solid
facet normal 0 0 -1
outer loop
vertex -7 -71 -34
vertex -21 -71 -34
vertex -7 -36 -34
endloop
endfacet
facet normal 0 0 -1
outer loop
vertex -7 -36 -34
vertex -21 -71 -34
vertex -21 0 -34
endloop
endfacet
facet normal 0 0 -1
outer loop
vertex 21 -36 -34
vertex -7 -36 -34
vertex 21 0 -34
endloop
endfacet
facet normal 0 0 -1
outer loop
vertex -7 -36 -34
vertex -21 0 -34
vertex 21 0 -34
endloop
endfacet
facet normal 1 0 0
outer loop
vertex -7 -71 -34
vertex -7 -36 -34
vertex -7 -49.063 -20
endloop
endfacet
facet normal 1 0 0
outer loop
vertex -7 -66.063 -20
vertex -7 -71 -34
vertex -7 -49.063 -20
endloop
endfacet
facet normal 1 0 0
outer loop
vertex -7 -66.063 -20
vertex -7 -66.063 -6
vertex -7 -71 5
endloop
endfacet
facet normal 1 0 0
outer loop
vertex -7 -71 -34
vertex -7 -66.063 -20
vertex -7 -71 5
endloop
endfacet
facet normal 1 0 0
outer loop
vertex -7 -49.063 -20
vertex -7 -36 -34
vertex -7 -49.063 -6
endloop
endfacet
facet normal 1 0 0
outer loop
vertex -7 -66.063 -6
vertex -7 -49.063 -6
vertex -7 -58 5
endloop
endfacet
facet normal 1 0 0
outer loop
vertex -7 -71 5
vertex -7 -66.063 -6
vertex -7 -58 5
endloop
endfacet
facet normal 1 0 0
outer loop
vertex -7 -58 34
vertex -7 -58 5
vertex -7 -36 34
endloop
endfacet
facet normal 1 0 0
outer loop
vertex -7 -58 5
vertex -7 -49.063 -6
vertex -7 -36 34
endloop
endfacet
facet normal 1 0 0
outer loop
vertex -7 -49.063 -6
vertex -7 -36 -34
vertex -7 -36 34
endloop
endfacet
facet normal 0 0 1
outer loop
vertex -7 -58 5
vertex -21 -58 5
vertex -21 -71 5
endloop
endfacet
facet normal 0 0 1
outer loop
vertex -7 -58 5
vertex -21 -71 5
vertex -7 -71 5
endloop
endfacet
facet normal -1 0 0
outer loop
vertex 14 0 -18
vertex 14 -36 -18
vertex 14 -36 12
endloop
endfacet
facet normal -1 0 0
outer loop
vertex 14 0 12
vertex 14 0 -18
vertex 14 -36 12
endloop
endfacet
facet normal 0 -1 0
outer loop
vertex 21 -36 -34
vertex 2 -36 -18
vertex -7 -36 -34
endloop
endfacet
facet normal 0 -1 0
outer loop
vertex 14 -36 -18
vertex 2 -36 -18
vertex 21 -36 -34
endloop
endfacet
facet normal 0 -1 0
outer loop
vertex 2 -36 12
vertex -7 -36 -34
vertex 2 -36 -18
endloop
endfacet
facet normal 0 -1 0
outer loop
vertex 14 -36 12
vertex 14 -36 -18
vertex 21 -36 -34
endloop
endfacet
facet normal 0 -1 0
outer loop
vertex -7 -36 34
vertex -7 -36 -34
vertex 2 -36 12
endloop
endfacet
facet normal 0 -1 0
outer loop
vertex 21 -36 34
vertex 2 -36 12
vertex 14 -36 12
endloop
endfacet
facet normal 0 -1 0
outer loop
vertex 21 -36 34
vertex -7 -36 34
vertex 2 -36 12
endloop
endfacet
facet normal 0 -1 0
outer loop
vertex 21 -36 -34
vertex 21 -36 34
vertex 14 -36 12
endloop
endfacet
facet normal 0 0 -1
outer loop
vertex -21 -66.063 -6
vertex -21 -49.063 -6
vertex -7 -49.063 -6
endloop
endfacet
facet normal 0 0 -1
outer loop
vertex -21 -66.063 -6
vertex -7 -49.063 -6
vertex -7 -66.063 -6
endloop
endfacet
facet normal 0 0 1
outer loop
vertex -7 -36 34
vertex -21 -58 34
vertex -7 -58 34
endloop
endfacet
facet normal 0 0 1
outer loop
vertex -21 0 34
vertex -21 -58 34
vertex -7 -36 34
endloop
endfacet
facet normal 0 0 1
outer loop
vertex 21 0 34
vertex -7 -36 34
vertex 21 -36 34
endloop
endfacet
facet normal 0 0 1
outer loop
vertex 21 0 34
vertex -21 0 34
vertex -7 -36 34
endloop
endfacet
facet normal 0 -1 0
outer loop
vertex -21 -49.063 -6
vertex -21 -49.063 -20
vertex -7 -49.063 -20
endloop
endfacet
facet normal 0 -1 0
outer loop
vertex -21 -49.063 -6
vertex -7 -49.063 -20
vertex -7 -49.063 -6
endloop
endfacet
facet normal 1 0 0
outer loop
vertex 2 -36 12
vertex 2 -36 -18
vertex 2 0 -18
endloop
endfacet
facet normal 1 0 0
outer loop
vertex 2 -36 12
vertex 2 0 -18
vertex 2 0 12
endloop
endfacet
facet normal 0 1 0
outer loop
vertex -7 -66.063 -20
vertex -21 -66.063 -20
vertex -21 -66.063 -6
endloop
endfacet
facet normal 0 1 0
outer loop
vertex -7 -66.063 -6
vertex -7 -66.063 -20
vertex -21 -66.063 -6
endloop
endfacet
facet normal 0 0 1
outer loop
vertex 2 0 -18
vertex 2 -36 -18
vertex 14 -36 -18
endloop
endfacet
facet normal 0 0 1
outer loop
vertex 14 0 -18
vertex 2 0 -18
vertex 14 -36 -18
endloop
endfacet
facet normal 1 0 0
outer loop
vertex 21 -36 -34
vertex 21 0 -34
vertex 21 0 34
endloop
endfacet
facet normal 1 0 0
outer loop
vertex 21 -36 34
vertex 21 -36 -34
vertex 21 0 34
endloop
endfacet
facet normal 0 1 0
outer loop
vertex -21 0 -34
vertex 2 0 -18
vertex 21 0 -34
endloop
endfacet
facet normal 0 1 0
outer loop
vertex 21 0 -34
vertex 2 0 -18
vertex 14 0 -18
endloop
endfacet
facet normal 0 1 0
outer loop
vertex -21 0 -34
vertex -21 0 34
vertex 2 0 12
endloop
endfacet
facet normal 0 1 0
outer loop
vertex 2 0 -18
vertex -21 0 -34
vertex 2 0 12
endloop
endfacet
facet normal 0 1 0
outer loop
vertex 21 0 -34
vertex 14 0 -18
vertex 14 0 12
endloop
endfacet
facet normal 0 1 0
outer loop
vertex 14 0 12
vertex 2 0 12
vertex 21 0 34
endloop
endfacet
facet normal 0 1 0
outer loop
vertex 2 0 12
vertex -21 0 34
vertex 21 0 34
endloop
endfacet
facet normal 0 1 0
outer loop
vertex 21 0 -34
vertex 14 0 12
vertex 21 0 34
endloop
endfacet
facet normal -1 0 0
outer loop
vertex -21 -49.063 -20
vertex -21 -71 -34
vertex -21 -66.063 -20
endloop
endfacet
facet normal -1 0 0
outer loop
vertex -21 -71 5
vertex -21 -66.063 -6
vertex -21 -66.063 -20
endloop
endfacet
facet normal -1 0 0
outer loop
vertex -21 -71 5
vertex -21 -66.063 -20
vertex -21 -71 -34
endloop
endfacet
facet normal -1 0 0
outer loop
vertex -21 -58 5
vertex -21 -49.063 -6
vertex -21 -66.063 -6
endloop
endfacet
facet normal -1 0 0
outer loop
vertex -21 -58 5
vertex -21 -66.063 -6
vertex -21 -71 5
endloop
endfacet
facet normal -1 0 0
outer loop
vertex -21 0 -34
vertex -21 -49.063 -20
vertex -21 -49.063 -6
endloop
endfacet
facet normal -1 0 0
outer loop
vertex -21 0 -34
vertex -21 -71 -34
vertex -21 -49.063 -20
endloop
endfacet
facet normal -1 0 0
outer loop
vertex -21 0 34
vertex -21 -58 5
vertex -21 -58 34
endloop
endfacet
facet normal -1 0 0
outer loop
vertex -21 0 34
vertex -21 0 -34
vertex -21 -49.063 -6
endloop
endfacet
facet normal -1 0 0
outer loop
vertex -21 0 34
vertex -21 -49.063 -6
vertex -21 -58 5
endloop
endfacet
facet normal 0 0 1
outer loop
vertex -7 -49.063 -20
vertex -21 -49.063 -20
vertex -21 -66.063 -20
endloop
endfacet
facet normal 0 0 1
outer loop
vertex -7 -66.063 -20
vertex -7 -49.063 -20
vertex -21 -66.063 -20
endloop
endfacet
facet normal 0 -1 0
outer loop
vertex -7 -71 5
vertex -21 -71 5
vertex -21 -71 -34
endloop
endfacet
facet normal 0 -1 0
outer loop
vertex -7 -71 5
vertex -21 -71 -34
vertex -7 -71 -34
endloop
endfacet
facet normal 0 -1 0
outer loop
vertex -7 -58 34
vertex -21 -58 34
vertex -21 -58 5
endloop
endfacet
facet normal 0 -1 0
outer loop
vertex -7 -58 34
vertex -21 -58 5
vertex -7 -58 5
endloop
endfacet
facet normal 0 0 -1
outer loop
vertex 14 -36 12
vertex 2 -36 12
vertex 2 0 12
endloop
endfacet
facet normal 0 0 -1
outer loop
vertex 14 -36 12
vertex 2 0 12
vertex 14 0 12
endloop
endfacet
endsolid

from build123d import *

# Parameters (mm, degrees)
F0_W     = 14
F0_H     = 39
F0_H_2   = 29
F1_DEPTH = 36
F2_W     = 14
F2_H     = 29
F3_DEPTH = 22
F4_W     = 14
F4_H     = 39
F5_DEPTH = 35
F6_W     = 17
F6_H     = 14
F7_DEPTH = 25
F8_W     = 12
F8_H     = 30
F9_DEPTH = 40


with BuildPart() as f1:
    # F0 (on Front) → F1 (new body)
    with BuildSketch(Plane.XZ):
        Polygon((-7, -34), (21, -34), (21, 34), (-7, 34), (-7, 5), align=None)
        with Locations((-14, -14.5)):
            Rectangle(F0_W, F0_H)
        with Locations((-14, 19.5)):
            Rectangle(F0_W, F0_H_2)
    extrude(amount=F1_DEPTH)

    # F2 (on face) → F3 (join)
    with BuildSketch(Plane.XZ.offset(36)):
        with Locations((-14, 19.5)):
            Rectangle(F2_W, F2_H)
    extrude(amount=F3_DEPTH)

    # F4 (on face) → F5 (join)
    with BuildSketch(Plane.XZ.offset(36)):
        with Locations((-14, -14.5)):
            Rectangle(F4_W, F4_H)
    extrude(amount=F5_DEPTH)

    # F6 (on face) → F7 (cut)
    with BuildSketch(Plane(origin=(-21, 0, 0), x_dir=(0, -1, 0), z_dir=(-1, 0, 0))):
        with Locations((57.56289, -13)):
            Rectangle(F6_W, F6_H)
    extrude(amount=-F7_DEPTH, mode=Mode.SUBTRACT)

    # F8 (on face) → F9 (cut)
    with BuildSketch(Plane.XZ.offset(36)):
        with Locations((8, -3)):
            Rectangle(F8_W, F8_H)
    extrude(amount=-F9_DEPTH, mode=Mode.SUBTRACT)


solid = f1.part
